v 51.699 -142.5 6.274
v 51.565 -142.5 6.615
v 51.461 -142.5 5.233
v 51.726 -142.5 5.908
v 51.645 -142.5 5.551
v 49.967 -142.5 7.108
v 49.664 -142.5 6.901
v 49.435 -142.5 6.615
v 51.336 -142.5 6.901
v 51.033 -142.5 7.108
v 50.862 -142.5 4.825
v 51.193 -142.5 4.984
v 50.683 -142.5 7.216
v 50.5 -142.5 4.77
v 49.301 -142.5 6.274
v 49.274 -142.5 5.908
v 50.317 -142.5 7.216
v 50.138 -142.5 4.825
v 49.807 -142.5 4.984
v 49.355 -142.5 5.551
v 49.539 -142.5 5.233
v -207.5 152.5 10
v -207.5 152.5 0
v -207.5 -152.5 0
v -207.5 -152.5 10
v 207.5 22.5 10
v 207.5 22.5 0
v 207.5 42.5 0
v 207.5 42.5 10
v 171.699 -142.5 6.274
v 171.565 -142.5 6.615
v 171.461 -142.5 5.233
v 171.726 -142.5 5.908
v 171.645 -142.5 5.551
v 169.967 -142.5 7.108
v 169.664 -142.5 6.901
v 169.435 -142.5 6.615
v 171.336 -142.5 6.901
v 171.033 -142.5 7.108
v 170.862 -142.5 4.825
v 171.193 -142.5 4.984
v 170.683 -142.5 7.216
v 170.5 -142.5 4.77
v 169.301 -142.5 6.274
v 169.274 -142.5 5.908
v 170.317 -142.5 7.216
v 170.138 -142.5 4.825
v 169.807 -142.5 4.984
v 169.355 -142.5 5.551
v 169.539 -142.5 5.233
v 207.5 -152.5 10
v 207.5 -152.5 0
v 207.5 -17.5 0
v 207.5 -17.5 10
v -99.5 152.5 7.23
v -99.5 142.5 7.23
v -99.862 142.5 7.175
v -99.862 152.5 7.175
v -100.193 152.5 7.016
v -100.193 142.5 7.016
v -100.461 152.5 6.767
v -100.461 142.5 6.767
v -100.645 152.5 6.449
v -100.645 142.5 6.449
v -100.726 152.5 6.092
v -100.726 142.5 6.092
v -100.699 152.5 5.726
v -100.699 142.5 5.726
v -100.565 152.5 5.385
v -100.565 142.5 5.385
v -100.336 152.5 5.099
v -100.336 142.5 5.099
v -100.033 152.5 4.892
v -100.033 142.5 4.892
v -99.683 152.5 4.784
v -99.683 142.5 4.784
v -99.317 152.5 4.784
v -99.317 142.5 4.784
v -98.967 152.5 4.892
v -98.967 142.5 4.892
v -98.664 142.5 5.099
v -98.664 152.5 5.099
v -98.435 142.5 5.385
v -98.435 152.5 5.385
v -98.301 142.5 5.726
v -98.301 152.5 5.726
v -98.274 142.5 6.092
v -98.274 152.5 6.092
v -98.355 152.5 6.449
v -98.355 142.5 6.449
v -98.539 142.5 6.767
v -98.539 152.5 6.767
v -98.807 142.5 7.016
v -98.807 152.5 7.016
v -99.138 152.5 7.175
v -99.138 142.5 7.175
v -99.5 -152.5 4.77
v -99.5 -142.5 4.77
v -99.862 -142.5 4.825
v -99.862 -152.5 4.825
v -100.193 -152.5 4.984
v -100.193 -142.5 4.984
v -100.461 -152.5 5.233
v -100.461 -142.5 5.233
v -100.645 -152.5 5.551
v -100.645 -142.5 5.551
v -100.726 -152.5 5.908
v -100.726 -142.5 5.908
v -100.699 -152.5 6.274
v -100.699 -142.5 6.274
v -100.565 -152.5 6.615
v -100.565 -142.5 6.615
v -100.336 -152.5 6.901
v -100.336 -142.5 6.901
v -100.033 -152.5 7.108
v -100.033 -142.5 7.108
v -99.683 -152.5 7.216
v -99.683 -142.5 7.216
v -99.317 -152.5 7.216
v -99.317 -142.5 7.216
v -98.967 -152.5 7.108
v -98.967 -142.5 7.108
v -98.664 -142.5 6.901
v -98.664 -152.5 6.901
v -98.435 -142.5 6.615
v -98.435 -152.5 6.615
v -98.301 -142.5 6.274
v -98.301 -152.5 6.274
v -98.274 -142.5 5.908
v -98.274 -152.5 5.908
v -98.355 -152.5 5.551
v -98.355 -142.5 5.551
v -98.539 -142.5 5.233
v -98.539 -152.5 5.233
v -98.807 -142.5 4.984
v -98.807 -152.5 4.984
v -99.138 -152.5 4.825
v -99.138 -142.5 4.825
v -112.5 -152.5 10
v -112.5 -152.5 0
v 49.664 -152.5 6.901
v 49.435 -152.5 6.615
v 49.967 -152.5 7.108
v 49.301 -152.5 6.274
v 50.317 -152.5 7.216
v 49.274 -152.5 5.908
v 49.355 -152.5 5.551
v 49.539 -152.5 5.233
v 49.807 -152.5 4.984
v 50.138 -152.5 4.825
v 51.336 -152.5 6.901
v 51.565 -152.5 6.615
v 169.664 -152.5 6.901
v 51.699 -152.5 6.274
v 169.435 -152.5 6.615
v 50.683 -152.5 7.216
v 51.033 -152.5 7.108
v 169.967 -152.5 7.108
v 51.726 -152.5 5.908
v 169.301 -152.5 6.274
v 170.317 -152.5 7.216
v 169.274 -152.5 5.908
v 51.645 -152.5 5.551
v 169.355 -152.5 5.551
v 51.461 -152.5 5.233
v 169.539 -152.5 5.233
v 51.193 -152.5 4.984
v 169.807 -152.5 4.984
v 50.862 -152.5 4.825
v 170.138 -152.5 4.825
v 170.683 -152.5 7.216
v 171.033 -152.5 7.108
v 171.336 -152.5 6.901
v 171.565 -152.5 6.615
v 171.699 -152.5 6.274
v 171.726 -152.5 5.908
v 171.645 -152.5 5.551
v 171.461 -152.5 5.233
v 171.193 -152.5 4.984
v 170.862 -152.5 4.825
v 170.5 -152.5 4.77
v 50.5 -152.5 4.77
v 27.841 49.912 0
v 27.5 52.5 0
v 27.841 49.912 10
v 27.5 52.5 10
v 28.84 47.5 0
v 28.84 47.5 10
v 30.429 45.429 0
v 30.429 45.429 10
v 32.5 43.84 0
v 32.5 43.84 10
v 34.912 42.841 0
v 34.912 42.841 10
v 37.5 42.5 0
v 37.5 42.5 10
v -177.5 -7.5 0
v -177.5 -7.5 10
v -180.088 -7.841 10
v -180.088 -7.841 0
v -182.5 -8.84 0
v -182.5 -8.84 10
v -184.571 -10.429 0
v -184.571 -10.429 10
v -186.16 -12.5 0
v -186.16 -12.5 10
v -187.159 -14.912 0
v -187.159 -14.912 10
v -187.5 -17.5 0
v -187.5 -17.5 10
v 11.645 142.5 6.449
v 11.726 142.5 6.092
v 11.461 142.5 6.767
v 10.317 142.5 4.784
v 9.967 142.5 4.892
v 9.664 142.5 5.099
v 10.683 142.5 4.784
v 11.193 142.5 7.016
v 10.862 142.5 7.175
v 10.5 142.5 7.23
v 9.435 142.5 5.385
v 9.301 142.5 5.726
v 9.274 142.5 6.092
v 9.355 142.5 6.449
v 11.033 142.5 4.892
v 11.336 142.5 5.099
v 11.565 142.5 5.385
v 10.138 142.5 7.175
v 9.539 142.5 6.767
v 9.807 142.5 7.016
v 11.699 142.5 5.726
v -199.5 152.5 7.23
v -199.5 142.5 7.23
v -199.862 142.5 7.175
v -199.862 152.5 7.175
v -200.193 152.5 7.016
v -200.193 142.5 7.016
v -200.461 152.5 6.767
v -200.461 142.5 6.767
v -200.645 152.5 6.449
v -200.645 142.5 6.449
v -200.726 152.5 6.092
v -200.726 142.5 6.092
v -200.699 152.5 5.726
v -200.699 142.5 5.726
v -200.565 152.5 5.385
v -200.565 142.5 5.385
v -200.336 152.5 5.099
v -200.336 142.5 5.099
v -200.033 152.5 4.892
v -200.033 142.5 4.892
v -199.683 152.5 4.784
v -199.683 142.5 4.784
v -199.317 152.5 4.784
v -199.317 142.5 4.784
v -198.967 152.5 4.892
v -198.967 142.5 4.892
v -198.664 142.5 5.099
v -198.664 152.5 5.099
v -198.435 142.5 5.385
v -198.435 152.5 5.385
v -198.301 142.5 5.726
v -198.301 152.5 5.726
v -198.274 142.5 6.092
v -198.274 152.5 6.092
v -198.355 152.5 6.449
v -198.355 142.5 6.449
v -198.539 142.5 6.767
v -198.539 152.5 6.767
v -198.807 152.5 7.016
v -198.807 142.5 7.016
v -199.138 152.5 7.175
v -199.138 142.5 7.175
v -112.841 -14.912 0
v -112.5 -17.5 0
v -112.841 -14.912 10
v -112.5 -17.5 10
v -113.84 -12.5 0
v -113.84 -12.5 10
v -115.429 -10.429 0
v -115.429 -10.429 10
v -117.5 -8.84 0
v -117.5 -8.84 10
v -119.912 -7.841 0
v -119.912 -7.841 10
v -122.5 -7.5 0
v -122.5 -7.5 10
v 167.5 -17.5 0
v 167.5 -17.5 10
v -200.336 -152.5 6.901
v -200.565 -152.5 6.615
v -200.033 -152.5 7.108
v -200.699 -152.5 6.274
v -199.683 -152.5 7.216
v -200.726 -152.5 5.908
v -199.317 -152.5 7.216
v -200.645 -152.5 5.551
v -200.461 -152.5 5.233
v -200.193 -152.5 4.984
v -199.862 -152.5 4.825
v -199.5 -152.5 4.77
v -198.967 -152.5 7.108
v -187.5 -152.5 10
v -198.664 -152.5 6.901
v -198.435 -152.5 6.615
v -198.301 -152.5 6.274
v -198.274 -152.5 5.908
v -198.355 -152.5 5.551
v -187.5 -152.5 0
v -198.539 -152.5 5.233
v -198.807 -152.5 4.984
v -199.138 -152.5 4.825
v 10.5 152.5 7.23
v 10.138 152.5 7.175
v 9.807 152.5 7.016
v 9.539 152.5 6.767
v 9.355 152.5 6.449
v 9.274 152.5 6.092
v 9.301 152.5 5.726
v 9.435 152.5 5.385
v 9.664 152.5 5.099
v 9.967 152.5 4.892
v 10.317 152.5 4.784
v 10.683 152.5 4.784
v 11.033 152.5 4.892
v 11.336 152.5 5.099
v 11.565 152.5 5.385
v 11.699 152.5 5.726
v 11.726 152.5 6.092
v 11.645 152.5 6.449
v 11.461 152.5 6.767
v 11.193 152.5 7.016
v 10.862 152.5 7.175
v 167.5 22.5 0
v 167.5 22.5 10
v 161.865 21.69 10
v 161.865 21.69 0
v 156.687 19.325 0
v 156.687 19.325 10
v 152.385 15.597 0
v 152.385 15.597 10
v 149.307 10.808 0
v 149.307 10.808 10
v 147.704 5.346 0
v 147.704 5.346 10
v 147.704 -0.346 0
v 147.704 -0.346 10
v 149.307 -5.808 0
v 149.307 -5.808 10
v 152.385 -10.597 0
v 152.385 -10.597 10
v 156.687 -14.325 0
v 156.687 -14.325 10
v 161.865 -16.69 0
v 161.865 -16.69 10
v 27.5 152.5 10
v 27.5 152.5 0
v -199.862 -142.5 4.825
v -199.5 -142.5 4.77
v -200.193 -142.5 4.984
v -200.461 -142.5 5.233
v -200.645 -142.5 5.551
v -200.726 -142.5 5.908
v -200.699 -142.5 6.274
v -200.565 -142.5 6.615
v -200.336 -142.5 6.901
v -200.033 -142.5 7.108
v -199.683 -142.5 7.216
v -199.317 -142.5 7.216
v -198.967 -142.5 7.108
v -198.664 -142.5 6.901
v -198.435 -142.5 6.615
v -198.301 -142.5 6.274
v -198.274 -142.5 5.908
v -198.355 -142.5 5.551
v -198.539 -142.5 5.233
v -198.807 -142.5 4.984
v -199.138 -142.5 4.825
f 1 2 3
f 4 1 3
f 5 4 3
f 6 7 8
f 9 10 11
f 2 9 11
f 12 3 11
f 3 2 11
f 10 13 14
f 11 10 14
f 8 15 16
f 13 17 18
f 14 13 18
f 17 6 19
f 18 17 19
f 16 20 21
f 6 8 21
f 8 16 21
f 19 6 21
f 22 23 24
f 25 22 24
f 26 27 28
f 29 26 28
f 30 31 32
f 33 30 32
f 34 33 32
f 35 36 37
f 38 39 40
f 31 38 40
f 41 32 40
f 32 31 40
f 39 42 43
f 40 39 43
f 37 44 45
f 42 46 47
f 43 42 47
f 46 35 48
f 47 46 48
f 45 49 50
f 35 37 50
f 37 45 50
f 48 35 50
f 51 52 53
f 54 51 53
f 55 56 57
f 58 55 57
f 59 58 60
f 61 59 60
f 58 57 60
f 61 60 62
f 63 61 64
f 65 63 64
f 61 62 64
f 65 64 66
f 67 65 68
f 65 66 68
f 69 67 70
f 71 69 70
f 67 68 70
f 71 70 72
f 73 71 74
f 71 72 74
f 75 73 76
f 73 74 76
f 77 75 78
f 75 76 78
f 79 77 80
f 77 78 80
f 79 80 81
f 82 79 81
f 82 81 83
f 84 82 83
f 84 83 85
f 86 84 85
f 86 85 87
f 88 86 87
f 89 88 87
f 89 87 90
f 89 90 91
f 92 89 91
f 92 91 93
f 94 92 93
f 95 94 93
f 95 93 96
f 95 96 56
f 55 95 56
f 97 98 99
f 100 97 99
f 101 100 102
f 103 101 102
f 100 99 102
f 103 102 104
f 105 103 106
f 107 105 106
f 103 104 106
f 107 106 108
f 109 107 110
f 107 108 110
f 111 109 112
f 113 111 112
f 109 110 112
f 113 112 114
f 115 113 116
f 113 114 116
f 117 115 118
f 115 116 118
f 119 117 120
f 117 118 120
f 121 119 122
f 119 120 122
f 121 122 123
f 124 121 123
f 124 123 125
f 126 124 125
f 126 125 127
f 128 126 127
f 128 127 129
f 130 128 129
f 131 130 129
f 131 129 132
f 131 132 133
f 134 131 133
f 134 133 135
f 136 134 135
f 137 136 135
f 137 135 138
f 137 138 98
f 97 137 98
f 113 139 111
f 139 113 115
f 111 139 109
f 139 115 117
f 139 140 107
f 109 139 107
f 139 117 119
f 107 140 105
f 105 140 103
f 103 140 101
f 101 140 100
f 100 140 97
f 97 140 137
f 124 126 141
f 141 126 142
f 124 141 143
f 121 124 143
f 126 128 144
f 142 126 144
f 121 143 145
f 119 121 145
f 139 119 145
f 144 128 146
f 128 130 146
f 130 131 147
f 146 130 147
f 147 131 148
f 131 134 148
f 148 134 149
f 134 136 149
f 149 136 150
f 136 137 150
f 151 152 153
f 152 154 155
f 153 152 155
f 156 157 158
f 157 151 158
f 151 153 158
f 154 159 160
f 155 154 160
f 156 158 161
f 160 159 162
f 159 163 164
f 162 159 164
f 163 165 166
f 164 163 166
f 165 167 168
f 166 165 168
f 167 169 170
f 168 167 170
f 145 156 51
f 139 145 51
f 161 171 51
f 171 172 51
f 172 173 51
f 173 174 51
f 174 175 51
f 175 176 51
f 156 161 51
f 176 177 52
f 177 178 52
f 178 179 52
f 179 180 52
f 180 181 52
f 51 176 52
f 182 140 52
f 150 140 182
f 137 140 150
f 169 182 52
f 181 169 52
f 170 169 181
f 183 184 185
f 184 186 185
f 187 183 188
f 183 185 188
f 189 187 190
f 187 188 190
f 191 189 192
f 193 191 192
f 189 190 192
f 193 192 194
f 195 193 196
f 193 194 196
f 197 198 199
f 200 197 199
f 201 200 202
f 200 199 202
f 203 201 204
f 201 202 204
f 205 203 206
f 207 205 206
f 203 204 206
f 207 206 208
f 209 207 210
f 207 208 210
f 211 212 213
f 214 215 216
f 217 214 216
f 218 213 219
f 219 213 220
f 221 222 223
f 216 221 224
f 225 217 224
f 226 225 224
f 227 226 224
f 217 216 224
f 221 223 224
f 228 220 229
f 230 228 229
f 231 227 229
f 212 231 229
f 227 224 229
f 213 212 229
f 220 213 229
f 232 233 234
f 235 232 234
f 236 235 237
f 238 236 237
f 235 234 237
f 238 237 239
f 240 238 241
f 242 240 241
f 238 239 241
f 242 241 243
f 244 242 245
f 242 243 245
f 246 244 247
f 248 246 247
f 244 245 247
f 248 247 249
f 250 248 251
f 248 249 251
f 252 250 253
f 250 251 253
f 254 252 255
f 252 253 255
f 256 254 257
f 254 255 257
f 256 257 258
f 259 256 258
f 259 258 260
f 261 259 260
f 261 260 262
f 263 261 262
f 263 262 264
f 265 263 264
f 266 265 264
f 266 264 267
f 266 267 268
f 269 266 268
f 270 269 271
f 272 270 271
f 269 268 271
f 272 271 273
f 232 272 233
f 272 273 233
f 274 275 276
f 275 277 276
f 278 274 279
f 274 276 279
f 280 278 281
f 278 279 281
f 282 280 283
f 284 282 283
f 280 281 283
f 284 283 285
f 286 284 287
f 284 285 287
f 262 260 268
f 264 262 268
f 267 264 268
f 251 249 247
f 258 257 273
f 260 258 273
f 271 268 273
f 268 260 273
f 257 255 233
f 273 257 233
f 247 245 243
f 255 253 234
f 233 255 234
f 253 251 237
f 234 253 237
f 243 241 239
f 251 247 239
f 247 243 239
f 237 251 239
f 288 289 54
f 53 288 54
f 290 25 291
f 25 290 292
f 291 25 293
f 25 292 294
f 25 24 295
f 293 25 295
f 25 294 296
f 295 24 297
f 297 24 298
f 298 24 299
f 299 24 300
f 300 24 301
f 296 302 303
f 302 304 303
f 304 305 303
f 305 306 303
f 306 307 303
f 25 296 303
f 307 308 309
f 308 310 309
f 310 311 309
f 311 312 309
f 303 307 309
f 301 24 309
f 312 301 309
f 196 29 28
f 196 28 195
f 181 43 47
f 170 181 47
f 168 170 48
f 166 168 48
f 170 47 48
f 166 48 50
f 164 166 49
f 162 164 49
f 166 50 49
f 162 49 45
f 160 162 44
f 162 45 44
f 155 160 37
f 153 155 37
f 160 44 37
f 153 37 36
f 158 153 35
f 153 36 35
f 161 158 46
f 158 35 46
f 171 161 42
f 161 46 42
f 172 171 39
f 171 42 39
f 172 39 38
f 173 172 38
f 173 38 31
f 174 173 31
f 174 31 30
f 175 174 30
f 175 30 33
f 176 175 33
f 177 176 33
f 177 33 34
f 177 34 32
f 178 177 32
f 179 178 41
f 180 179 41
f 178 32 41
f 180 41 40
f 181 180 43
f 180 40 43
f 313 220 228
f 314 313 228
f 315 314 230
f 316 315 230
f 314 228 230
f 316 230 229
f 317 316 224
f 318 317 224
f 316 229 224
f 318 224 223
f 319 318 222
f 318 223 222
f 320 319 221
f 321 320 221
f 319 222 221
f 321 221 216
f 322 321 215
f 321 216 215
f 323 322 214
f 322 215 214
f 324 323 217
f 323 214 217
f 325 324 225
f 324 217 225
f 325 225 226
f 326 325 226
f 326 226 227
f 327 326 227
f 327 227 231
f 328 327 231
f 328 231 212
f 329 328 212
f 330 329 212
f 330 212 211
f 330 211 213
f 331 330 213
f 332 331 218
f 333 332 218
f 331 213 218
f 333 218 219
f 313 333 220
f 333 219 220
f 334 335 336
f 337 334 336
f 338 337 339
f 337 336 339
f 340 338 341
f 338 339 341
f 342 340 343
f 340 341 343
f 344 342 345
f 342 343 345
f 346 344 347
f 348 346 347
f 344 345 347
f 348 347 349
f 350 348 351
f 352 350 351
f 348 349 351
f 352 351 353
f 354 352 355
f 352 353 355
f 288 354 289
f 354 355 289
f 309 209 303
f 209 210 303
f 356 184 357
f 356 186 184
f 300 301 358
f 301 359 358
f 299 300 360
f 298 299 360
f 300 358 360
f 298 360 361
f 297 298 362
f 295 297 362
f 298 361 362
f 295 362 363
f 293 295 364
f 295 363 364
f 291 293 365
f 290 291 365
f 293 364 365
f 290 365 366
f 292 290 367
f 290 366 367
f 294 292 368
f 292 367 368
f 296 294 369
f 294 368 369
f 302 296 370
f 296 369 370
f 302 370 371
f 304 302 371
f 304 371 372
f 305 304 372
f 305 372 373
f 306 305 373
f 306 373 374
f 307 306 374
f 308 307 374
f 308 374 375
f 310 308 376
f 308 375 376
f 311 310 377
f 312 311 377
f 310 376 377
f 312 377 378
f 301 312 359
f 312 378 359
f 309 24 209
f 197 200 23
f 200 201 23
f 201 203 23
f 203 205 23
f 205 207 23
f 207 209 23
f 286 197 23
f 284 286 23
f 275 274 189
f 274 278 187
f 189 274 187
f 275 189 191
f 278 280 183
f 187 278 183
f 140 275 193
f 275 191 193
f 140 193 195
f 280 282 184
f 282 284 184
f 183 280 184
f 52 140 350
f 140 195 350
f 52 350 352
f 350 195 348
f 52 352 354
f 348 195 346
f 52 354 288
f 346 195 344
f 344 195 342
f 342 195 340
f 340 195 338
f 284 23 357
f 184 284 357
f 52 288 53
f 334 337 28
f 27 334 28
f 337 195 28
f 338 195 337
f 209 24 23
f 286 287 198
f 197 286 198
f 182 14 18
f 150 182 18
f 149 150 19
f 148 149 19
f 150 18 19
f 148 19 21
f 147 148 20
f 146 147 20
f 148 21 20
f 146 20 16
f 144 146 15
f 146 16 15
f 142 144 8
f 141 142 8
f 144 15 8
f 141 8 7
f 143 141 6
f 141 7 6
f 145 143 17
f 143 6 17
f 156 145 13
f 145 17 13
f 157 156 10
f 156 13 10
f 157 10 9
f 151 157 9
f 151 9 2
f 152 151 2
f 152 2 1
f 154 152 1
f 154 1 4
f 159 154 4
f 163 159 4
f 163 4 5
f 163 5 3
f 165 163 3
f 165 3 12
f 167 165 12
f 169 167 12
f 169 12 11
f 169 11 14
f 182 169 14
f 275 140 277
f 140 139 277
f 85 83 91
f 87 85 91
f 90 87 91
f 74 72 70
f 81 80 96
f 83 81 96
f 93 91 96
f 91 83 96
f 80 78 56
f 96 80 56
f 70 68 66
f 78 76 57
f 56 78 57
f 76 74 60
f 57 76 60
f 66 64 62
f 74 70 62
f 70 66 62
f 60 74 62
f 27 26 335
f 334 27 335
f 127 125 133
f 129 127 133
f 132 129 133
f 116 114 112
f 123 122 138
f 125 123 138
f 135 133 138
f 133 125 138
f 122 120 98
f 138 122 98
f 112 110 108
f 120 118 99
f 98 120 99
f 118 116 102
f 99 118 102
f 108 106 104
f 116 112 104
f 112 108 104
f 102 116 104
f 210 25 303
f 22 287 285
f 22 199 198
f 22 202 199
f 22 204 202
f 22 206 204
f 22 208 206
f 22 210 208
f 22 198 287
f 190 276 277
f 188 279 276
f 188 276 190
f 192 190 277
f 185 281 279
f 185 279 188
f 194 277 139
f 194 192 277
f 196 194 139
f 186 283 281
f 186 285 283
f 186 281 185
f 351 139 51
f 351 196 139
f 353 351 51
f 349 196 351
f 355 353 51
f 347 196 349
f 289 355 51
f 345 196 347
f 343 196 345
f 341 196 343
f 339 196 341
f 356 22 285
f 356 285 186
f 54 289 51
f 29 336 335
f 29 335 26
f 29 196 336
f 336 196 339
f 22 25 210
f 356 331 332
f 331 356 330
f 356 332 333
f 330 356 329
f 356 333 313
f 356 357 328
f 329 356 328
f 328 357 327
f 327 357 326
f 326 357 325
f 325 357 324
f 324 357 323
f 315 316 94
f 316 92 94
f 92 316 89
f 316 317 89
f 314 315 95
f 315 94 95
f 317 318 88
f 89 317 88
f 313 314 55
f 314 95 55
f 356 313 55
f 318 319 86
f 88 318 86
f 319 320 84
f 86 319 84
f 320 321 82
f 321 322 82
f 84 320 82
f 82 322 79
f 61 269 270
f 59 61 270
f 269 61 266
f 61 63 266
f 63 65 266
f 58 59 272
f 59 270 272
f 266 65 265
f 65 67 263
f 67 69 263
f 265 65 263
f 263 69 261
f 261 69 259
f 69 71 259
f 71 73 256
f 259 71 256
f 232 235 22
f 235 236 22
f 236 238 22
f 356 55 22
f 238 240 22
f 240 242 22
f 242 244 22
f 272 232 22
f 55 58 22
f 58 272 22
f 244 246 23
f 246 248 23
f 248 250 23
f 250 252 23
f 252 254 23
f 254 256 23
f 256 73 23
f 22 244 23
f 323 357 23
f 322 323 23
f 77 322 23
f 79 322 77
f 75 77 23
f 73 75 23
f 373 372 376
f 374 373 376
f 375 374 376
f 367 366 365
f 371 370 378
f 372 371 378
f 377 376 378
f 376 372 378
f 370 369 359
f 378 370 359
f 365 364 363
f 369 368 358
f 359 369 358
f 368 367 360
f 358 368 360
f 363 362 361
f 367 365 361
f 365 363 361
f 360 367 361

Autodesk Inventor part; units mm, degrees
ref_plane "YZ Plane" through (0, 0, 0) normal (1, 0, 0) x (0, 1, 0)
ref_plane "XZ Plane" through (0, 0, 0) normal (0, 1, 0) x (-1, 0, 0)
ref_plane "XY Plane" through (0, 0, 0) normal (0, 0, 1) x (1, 0, 0)
sketch "Sketch1" plane through (0, 0, 0) normal (0, 0, 1) x (1, 0, 0)
  line L0 (-207.5, -152.5) -> (207.5, -152.5)
  line L1 (207.5, -152.5) -> (207.5, 152.5)
  line L2 (207.5, 152.5) -> (-207.5, 152.5)
  line L3 (-207.5, 152.5) -> (-207.5, -152.5)
  line L4 (-207.5, -152.5) -> (207.5, 152.5) construction
  line L5 (207.5, -152.5) -> (-207.5, 152.5) construction
  point P0 (0, 0)
  dimension "d0" = 415
  dimension "d1" = 305
extrude "Extrusion1" add sketch "Sketch1" along normal blind 10
sketch "Sketch2" plane through (0, 0, 10) normal (0, 0, 1) x (1, 0, 0)
  line L0 (-207.5, -152.5) -> (207.5, -152.5) projected
  line L1 (-187.5, -152.5) -> (-112.5, -152.5)
  line L2 (-112.5, -152.5) -> (-112.5, -17.5)
  line L3 (-122.5, -7.5) -> (-177.5, -7.5)
  line L4 (-187.5, -17.5) -> (-187.5, -152.5)
  line L5 (-207.5, 152.5) -> (-207.5, -152.5) projected
  line L6 (207.5, -152.5) -> (207.5, 152.5) projected
  line L7 (207.5, 22.5) -> (167.5, 22.5)
  line L8 (167.5, 22.5) -> (167.5, -17.5) construction
  line L9 (167.5, -17.5) -> (207.5, -17.5)
  line L10 (207.5, -17.5) -> (207.5, 22.5)
  line L11 (207.5, 152.5) -> (-207.5, 152.5) projected
  arc A0 (167.5, 22.5) -> (167.5, -17.5) centre (167.5, 2.5) ccw
  line L12 (27.5, 152.5) -> (207.5, 152.5)
  line L13 (207.5, 152.5) -> (207.5, 42.5)
  line L14 (207.5, 42.5) -> (37.5, 42.5)
  line L15 (27.5, 52.5) -> (27.5, 152.5)
  arc A1 (-177.5, -7.5) -> (-187.5, -17.5) centre (-177.5, -17.5) ccw
  arc A2 (-112.5, -17.5) -> (-122.5, -7.5) centre (-122.5, -17.5) ccw
  arc A3 (27.5, 52.5) -> (37.5, 42.5) centre (37.5, 52.5) ccw
  point P0 (0, 0)
  point P1 (-112.5, -7.5)
  point P2 (-187.5, -7.5)
  point P3 (27.5, 42.5)
  dimension "d4" = 145
  dimension "d5" = 75
  dimension "d6" = 20
  dimension "d7" = 40
  dimension "d8" = 40
  dimension "d9" = 130
  dimension "d10" = 110
  dimension "d11" = 180
  dimension "d41" = 10
extrude "Extrusion2" cut sketch "Sketch2" against normal blind 10 contours L4 A1 L3 A2 L2 L0 | L11 L6 L14 A3 L15 | L9 A0 L7 L6
sketch "Sketch3" plane through (207.5, -152.5, 0) normal (0, -1, 0) x (1, 0, 0)
  line L0 (-415, 0) -> (-415, 10) projected
  line L1 (-415, 6) -> (0, 6) construction
  line L2 (0, 10) -> (0, 0) projected
  line L3 (-320, 0) -> (0, 0) construction
  line L4 (-395, 0) -> (-395, 10) construction
  point P0 (-207.5, 0)
  point P1 (-407, 6)
  point P2 (-307, 6)
  point P3 (-37, 6)
  point P4 (-157, 6)
  dimension "d14" = 6
  dimension "d15" = 415
  dimension "d16" = 20
  dimension "d17" = 8
  dimension "d18" = 100
  dimension "d19" = 150
  dimension "d20" = 120
sketch "Sketch4" plane through (-207.5, 152.5, 10) normal (0, 1, 0) x (1, 0, 0)
  line L0 (0, 10) -> (0, 0) projected
  line L1 (0, 4) -> (235, 4) construction
  line L2 (235, 10) -> (0, 10) projected
  point P0 (207.5, 10)
  point P1 (8, 4)
  point P2 (108, 4)
  point P3 (218, 4)
  dimension "d22" = 6
  dimension "d23" = 8
  dimension "d24" = 210
  dimension "d25" = 100
hole "Hole1" at (-199.5, -152.5, 6) at (-99.5, -152.5, 6) at (50.5, -152.5, 6) at (170.5, -152.5, 6) direction (0, 1, 0) diameter 2.459 depth 10 thread size "M3x0.5" designation "M3" class "6H" standard "ISO Metric profile"
hole "Hole2" at (10.5, 152.5, 6) at (-99.5, 152.5, 6) at (-199.5, 152.5, 6) direction (0, -1, 0) diameter 2.459 depth 10 thread size "M3x0.5" designation "M3" class "6H" standard "ISO Metric profile"
properties part number "Bottom"
